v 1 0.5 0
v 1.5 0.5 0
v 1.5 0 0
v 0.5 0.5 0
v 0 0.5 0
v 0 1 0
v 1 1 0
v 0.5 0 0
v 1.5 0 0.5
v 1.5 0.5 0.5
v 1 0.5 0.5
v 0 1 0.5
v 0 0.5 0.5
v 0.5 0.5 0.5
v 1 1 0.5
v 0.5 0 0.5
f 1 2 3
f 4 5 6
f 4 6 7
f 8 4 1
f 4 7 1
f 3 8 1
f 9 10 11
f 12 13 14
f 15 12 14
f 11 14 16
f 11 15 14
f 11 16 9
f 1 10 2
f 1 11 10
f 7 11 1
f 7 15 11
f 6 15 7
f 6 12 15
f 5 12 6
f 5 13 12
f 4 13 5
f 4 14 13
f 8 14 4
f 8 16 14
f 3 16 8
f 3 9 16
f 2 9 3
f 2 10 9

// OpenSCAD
// Tetromino (S) for Stacks of Shapes
// by Slashee the Cow
linear_extrude(0.5)
polygon([[0.5,0],[1.5,0],[1.5,0.5],[1,0.5],[1,1],[0,1],[0,0.5],[0.5,0.5]]);
